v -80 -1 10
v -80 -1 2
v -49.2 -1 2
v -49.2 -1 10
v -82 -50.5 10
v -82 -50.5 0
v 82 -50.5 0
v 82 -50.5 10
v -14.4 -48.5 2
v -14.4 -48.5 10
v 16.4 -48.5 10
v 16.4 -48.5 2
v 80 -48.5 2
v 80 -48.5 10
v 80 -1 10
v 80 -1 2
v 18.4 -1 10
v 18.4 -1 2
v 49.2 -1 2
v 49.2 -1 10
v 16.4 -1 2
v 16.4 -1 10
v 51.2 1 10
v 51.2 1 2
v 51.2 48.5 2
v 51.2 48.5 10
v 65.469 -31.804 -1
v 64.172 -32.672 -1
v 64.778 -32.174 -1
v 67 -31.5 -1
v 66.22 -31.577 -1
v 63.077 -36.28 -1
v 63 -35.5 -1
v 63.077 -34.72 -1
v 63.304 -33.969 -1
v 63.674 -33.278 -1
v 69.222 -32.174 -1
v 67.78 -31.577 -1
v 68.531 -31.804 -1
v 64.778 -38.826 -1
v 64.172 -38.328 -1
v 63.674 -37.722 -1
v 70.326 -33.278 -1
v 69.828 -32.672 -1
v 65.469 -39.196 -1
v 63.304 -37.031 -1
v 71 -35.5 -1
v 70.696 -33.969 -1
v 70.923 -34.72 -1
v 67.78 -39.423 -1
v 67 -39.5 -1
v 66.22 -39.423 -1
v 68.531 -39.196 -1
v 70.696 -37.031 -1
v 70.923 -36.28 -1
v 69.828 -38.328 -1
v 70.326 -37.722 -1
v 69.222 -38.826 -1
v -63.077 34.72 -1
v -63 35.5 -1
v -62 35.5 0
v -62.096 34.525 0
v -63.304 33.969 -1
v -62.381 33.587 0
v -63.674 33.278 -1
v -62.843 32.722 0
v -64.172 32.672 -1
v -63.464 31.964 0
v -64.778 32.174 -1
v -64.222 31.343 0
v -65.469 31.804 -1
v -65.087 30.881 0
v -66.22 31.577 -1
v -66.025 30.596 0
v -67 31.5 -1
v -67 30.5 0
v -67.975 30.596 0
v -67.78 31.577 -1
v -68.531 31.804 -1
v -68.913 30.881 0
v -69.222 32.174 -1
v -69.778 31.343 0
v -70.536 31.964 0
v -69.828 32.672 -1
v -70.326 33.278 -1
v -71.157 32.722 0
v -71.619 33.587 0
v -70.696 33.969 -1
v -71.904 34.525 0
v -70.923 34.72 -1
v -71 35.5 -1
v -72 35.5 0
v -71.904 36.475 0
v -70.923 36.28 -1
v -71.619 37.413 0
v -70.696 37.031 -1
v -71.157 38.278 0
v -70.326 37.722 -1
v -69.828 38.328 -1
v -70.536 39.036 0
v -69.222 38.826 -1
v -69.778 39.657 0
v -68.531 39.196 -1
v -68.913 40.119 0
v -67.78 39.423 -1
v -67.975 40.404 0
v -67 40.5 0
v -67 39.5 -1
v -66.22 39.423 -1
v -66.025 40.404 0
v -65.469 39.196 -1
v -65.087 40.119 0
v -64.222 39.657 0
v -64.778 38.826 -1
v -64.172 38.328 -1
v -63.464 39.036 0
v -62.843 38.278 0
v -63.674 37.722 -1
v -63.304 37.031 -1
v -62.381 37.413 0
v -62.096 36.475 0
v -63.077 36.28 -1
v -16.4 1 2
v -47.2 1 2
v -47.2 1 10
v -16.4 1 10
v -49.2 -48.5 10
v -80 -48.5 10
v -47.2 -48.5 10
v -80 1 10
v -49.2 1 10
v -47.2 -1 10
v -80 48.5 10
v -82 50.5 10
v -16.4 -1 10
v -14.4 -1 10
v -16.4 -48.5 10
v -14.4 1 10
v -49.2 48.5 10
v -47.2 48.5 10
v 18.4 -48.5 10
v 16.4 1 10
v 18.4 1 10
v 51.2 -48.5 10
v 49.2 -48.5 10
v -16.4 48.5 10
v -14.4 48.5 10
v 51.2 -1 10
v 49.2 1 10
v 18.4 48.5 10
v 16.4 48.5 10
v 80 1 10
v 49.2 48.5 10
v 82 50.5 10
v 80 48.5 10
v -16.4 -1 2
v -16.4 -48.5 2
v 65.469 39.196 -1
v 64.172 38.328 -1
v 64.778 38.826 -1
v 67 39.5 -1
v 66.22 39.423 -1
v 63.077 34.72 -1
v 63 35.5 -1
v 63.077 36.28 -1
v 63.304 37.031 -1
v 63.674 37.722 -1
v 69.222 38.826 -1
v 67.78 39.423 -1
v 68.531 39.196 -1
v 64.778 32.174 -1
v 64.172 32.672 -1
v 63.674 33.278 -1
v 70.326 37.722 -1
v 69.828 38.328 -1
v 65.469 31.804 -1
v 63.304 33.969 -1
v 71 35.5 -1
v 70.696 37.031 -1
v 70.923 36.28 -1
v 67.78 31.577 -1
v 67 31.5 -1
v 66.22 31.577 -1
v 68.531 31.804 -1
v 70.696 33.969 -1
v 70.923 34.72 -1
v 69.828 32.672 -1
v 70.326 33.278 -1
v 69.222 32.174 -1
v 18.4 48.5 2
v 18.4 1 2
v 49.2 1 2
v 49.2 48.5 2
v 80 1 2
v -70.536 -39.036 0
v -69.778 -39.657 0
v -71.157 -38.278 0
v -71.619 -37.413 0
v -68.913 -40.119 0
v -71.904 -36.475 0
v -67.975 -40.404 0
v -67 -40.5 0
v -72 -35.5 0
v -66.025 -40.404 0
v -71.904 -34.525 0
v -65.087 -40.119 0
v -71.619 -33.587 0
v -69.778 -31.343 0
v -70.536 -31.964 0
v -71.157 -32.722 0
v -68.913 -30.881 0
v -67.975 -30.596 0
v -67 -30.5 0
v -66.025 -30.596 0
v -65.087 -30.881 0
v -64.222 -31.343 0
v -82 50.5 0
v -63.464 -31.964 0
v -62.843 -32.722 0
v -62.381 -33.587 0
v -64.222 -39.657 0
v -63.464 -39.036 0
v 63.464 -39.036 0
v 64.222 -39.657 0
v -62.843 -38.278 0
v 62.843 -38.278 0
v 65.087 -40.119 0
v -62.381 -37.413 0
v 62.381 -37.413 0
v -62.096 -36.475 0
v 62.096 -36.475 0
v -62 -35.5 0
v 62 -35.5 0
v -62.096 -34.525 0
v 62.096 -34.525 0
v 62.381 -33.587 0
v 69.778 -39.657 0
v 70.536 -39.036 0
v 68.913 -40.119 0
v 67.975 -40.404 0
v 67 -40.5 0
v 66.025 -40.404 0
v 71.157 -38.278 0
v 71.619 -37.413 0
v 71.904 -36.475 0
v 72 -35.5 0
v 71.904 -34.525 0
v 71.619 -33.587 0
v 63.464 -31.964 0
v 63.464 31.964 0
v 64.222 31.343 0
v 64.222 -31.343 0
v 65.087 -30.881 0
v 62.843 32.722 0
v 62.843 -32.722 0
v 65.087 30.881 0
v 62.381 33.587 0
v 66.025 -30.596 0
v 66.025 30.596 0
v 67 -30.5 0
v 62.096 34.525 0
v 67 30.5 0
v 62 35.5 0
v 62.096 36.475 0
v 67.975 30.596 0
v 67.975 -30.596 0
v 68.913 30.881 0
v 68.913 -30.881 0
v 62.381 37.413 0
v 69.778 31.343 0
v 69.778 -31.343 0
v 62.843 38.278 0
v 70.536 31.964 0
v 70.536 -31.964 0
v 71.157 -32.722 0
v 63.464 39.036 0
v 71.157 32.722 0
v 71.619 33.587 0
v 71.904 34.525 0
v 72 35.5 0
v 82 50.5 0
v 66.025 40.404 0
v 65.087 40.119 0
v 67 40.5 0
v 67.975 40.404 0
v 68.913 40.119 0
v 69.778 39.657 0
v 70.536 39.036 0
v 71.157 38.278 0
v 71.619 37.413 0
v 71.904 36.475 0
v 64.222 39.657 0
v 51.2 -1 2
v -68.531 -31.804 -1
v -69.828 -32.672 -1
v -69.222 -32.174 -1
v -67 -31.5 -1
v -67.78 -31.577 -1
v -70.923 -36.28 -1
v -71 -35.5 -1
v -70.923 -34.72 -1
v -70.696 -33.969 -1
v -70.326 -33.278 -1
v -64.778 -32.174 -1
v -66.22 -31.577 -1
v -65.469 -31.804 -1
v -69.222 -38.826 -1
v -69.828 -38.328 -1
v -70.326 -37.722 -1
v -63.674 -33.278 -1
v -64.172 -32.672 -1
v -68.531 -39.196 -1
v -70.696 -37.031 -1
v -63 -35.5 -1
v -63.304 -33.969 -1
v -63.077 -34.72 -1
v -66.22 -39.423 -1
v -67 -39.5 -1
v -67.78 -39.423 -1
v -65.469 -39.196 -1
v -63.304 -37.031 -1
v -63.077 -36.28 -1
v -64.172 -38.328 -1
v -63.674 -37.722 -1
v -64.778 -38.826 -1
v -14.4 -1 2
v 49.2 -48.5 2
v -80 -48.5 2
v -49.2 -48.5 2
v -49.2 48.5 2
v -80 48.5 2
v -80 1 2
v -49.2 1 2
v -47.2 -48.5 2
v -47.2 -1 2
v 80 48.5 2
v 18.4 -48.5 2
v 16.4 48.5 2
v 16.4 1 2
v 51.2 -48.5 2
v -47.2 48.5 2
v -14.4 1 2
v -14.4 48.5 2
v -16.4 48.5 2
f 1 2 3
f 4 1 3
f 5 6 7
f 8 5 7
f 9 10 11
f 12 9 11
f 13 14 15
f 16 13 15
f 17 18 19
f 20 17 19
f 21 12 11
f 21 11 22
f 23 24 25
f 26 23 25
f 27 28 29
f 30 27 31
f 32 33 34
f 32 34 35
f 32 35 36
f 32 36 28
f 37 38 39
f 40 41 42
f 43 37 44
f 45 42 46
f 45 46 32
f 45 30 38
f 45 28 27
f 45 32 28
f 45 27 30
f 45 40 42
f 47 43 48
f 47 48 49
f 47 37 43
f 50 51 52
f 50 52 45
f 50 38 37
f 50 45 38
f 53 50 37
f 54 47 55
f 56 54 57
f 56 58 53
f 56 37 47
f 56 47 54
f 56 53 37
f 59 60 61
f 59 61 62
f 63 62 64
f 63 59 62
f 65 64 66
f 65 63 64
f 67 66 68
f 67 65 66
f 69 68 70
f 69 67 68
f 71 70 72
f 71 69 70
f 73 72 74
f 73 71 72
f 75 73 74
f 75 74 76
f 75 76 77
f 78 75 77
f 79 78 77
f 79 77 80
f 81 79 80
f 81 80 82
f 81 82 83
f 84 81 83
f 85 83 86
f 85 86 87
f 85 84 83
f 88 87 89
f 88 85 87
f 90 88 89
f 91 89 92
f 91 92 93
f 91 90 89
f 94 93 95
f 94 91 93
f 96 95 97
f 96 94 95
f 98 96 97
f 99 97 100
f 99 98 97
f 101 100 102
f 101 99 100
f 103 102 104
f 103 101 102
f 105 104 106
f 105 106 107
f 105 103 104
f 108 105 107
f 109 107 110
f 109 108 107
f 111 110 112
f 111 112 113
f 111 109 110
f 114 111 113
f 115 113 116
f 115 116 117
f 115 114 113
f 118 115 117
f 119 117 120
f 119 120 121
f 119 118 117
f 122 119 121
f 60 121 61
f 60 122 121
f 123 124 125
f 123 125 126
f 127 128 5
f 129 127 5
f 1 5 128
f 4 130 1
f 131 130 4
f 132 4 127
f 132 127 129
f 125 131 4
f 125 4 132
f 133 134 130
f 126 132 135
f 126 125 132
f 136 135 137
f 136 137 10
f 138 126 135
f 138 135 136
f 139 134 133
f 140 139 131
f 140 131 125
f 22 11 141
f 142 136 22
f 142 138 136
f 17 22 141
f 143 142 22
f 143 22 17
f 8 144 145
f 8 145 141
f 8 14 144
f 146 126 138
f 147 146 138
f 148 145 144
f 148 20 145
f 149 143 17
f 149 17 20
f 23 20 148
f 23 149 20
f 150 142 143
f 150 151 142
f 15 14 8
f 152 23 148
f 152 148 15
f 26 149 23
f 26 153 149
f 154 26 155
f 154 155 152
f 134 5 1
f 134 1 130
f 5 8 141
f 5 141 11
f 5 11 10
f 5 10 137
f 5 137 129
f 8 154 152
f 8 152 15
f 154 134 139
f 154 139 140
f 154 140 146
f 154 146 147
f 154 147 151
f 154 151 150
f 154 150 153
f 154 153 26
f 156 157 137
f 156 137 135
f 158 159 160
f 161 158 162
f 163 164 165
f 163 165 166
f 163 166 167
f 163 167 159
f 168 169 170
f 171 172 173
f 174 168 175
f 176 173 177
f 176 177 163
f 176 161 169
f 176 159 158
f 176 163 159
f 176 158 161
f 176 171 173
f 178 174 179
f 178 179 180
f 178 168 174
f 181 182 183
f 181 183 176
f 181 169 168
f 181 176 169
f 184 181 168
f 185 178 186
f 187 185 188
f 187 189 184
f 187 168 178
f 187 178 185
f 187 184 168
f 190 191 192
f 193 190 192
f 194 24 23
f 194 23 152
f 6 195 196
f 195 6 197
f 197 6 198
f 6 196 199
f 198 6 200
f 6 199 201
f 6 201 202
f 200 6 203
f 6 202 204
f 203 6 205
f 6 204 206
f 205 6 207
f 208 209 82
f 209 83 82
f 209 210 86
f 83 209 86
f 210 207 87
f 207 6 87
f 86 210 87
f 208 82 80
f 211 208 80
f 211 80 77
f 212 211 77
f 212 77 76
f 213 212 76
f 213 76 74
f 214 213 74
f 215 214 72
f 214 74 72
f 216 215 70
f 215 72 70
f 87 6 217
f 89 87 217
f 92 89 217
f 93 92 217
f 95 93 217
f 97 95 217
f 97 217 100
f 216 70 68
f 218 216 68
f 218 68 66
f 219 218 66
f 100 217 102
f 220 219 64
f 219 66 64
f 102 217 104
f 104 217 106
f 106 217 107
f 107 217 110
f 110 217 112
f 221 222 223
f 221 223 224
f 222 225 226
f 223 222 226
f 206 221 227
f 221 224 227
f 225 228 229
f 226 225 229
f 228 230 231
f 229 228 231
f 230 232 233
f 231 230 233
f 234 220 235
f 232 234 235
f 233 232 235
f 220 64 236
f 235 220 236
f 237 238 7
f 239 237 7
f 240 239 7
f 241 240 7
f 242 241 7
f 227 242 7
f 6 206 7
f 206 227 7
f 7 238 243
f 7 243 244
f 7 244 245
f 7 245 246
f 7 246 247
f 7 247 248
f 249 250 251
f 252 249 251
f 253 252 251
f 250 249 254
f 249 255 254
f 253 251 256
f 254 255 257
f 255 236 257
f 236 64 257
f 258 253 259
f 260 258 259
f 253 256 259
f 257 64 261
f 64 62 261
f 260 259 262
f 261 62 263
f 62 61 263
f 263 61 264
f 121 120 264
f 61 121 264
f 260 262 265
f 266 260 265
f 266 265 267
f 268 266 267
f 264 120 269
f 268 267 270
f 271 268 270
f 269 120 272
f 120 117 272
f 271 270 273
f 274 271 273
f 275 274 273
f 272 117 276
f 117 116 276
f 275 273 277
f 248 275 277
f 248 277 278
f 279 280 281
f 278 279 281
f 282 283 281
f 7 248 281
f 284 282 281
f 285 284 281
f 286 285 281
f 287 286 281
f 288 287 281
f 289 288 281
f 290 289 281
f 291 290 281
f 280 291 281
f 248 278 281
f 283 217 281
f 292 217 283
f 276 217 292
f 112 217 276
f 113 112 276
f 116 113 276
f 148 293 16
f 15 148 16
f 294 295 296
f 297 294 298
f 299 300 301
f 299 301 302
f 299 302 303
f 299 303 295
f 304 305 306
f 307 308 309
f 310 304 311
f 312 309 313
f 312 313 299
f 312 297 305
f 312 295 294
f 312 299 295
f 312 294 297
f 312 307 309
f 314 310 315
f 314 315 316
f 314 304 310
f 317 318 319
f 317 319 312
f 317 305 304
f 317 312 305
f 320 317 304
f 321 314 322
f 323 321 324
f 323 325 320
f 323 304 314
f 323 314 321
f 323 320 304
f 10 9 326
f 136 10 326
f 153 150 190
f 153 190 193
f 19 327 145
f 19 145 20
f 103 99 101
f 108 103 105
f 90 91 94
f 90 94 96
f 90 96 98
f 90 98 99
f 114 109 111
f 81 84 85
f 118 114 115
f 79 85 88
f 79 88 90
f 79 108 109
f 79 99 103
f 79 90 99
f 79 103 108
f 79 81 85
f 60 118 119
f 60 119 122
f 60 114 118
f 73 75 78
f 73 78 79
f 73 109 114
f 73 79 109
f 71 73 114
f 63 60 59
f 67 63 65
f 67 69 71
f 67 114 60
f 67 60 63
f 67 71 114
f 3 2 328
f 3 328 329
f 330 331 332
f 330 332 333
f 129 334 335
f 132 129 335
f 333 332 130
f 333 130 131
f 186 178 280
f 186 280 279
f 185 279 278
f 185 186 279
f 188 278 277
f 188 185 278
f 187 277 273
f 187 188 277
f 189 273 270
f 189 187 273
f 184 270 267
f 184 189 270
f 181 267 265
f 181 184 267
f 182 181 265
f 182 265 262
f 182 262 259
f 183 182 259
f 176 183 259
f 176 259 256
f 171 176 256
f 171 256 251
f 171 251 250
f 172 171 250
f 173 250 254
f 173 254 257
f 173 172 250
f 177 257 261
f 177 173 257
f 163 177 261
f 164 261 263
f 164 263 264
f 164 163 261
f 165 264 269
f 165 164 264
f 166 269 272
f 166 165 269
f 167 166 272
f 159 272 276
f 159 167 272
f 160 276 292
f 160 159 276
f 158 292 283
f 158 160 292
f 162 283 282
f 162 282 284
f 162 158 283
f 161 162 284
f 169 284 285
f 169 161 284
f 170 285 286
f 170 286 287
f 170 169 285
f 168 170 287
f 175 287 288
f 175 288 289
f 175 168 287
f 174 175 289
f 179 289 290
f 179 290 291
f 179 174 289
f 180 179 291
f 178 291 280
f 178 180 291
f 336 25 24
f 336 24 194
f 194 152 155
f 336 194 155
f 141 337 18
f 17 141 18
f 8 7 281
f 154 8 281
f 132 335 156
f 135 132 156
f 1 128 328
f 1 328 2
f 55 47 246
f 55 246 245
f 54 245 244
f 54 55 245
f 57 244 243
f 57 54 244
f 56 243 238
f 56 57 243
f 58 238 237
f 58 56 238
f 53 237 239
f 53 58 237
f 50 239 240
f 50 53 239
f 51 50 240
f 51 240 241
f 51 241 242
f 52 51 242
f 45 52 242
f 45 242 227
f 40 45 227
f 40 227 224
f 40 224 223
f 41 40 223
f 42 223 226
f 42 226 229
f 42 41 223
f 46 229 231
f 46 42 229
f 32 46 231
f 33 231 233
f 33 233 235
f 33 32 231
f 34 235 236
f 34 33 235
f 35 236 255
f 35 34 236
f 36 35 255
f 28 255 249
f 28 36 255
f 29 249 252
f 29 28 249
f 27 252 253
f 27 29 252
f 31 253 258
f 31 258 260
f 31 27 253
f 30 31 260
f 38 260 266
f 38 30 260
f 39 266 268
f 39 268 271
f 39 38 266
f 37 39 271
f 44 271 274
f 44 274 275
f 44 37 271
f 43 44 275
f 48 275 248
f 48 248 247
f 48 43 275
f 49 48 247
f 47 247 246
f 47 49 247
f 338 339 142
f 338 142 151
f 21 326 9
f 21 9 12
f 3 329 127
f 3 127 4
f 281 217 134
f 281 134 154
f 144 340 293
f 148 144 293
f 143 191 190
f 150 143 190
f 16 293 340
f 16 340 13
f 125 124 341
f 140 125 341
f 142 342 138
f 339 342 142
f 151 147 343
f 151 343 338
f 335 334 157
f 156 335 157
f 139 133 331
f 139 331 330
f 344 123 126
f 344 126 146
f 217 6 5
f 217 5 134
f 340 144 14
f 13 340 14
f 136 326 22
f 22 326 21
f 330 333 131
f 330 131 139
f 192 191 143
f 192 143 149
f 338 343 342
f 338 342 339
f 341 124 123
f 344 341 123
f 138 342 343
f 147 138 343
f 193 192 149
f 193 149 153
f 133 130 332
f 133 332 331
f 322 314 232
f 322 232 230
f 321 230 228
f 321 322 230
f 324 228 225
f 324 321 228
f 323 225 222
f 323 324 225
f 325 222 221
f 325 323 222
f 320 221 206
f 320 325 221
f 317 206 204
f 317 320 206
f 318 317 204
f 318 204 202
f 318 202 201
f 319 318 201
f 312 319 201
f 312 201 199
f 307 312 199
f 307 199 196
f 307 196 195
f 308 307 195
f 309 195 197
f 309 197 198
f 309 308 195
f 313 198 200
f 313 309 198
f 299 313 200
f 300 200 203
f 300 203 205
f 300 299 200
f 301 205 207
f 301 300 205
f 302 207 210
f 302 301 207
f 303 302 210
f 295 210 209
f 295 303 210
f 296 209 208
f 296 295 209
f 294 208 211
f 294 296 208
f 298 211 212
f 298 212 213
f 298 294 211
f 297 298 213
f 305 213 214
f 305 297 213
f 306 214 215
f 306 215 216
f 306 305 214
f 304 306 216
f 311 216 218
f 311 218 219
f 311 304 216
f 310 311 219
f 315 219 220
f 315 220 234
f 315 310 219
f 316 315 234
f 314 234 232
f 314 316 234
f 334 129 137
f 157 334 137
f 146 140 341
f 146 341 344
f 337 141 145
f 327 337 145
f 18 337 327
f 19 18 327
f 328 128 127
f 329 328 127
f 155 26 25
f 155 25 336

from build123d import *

# Parameters (mm, degrees)
F0_W     = 164
F0_H     = 101
F1_DEPTH = 10
F2_W     = 160
F2_H     = 97
F3_DEPTH = 8
F4_W     = 160
F4_H     = 2
F5_DEPTH = 8
F6_W     = 2
F6_H     = 97
F7_DEPTH = 8
F8_R     = 5
F9_DEPTH = 1
F10_SIZE = 0.99999


# Not quite as in the source:
# - a fillet or chamfer is up to 0.001 mm smaller than in the source, because OpenCascade refuses the exact size


with BuildPart() as f1:
    # F0 (on Top) → F1 (new body)
    with BuildSketch(Plane.XY):
        Rectangle(F0_W, F0_H)
    extrude(amount=F1_DEPTH)

    # F2 (on face) → F3 (cut)
    with BuildSketch(Plane.XY.offset(10)):
        Rectangle(F2_W, F2_H)
    extrude(amount=-F3_DEPTH, mode=Mode.SUBTRACT)

    # F4 (on face) → F5 (join)
    with BuildSketch(Plane.XY.offset(2)):
        Rectangle(F4_W, F4_H)
    extrude(amount=F5_DEPTH)

    # F6 (on face) → F7 (join)
    with BuildSketch(Plane.XY.offset(2)):
        with Locations((-48.2, 0)):
            Rectangle(F6_W, F6_H)
        with Locations((-15.4, 0)):
            Rectangle(F6_W, F6_H)
        with Locations((17.4, 0)):
            Rectangle(F6_W, F6_H)
        with Locations((50.2, 0)):
            Rectangle(F6_W, F6_H)
    extrude(amount=F7_DEPTH)

    # F8 (on face) → F9 (join)
    with BuildSketch(Plane(origin=(0, 0, 0), x_dir=(1, 0, 0), z_dir=(0, 0, -1))):
        with Locations((-67, 35.5)):
            Circle(F8_R)
        with Locations((67, 35.5)):
            Circle(F8_R)
        with Locations((67, -35.5)):
            Circle(F8_R)
        with Locations((-67, -35.5)):
            Circle(F8_R)
    extrude(amount=F9_DEPTH)

    # F10 (size 1 in the source; OpenCascade refuses exactly that, so slightly less here)
    f10_edges = [f1.edges().sort_by_distance(p)[0] for p in [
        (-72, -35.5, -1),
        (-72, 35.5, -1),
        (62, -35.5, -1),
        (62, 35.5, -1),
    ]]
    chamfer(f10_edges, length=F10_SIZE)


solid = f1.part
